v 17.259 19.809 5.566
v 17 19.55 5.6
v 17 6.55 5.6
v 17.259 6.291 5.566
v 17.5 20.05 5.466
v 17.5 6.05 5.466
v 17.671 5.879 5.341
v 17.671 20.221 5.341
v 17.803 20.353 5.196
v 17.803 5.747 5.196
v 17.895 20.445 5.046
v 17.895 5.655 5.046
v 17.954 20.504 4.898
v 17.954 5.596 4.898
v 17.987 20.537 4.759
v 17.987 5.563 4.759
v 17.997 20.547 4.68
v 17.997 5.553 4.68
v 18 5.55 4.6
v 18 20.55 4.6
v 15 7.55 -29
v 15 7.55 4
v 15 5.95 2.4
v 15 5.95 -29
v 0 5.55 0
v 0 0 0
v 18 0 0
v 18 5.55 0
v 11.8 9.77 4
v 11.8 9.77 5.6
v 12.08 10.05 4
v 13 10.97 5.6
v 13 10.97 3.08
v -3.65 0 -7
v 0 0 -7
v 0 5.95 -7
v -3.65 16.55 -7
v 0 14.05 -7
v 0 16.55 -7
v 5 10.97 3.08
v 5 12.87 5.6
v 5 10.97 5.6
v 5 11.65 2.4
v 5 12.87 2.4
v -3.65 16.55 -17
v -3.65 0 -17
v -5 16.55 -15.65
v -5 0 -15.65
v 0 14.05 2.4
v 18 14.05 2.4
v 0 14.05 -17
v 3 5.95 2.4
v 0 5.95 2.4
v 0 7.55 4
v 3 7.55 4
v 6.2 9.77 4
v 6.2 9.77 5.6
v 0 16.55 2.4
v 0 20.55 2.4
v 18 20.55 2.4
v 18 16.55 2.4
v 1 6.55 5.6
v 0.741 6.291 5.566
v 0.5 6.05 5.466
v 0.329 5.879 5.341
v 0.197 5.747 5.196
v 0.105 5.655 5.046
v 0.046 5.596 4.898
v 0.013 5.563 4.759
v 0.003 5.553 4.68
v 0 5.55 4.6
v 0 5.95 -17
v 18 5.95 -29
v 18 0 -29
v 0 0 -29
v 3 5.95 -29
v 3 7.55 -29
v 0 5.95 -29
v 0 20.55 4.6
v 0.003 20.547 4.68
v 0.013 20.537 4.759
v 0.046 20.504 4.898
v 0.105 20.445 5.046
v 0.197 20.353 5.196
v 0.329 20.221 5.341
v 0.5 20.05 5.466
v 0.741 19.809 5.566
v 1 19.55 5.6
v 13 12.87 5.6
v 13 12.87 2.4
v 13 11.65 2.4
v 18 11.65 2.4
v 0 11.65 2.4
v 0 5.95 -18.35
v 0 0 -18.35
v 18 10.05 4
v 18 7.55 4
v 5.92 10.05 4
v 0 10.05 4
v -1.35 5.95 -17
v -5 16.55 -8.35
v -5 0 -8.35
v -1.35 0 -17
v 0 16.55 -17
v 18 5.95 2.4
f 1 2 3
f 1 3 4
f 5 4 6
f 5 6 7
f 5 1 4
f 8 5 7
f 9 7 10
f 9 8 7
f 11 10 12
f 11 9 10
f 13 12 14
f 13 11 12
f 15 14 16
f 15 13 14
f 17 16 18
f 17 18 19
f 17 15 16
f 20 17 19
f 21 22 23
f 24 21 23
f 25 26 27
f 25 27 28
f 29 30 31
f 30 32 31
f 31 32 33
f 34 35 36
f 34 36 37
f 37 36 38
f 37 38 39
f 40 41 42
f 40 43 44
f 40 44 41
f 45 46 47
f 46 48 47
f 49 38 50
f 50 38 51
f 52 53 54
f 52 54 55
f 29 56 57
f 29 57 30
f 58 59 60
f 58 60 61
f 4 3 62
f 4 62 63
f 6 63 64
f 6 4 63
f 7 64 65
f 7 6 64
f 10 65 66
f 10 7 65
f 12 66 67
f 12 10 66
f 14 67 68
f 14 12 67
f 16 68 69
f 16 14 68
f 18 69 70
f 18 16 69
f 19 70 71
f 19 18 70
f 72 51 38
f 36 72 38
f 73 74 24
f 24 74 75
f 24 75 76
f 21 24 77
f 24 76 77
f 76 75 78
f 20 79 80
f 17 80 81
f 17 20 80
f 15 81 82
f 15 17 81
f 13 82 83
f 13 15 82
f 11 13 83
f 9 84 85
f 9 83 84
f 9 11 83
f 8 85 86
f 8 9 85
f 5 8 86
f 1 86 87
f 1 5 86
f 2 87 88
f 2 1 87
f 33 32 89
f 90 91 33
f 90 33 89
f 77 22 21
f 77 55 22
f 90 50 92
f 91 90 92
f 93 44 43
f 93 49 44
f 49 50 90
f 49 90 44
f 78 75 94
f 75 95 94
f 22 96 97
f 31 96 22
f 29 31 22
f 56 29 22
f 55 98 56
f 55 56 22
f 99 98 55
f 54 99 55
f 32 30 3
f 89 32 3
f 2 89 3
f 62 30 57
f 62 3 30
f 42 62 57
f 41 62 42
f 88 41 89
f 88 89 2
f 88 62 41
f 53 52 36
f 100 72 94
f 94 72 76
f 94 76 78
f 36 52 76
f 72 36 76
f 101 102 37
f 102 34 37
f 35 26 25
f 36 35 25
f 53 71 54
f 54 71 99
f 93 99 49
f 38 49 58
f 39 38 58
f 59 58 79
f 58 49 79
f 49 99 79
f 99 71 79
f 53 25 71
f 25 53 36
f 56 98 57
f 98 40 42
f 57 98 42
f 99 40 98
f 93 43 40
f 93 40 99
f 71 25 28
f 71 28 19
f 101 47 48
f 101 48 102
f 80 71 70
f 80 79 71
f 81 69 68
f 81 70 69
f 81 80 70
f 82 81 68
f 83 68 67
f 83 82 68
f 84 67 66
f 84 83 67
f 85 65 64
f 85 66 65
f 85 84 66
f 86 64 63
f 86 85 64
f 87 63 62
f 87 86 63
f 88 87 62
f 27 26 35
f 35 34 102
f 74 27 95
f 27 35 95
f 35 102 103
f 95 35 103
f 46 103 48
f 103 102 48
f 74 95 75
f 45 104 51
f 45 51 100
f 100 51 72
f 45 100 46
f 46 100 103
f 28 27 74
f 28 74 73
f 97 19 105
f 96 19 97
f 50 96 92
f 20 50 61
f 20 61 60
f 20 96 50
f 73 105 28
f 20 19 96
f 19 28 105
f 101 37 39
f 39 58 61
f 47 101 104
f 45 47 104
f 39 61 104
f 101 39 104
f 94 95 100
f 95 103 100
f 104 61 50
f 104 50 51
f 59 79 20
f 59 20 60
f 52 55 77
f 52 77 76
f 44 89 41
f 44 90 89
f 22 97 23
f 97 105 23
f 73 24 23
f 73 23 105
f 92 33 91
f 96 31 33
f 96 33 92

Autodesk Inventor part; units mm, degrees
ref_plane "YZ Plane" through (0, 0, 0) normal (1, 0, 0) x (0, 1, 0)
ref_plane "XZ Plane" through (0, 0, 0) normal (0, 1, 0) x (-1, 0, 0)
ref_plane "XY Plane" through (0, 0, 0) normal (0, 0, 1) x (1, 0, 0)
sketch "Sketch1" plane through (0, 0, 0) normal (1, 0, 0) x (0, 1, 0)
  line L0 (0, 0) -> (5.55, 0)
  line L1 (5.55, 0) -> (5.55, 5.6)
  line L2 (5.55, 5.6) -> (20.55, 5.6)
  line L3 (20.55, 5.6) -> (20.55, 2.4)
  line L4 (20.55, 2.4) -> (10.05, 2.4)
  line L5 (10.05, 2.4) -> (10.05, 4)
  line L6 (10.05, 4) -> (7.55, 4)
  line L7 (7.55, 4) -> (7.55, -29)
  line L8 (0, 0) -> (0, -29)
  line L9 (0, -29) -> (7.55, -29)
  dimension "d1" = 5.55
  dimension "d2" = 15
  dimension "d3" = 2
  dimension "d4" = 2.5
  dimension "d5" = 1.6
  dimension "d6" = 29
  dimension "d7" = 33
  dimension "d8" = 3.2
extrude "Extrusion1" add sketch "Sketch1" along normal blind 18
sketch "Sketch2" plane through (0, 10.05, 2.4) normal (0, 0, -1) x (-1, 0, 0)
  line L0 (0, 0) -> (-18, 0) projected
  line L1 (-9, 0) -> (-9, -5.1044) construction
  line L2 (-13, 2.82) -> (-5, 2.82)
  line L3 (-5, 2.82) -> (-5, -0.28)
  line L4 (-5, -0.28) -> (-13, -0.28)
  line L5 (-13, -0.28) -> (-13, 2.82)
  point P0 (0, -10.05)
  point P1 (-9, -0.28)
  dimension "d11" = 3.1
  dimension "d12" = 8
extrude "Extrusion2" cut sketch "Sketch2" against normal up to surface (3.2 mm away)
chamfer "Chamfer1" distance 1.2 angle 45 2 edges at (5, 9.77, 4.8) (13, 9.77, 4.8)
chamfer "Chamfer2" distance 1.6 angle 45 2 edges at (15.04, 10.05, 2.4) (2.96, 10.05, 2.4)
fillet "Fillet1" radius 1 4 edges at (9, 5.55, 5.6) (9, 20.55, 5.6) (18, 13.05, 5.6) (0, 13.05, 5.6)
sketch "Sketch3" plane through (0, 0, -29) normal (0, 0, -1) x (-1, 0, 0)
  line L0 (0, 7.55) -> (-18, 7.55) projected
  line L1 (-9, 7.55) -> (-9, 5.1292) construction
  line L2 (-18, 7.55) -> (-15, 7.55)
  line L3 (-15, 7.55) -> (-15, 5.95)
  line L4 (-15, 5.95) -> (-18, 5.95)
  line L5 (-18, 5.95) -> (-18, 7.55)
  line L6 (0, 7.55) -> (-3, 7.55)
  line L7 (-3, 7.55) -> (-3, 5.95)
  line L8 (-3, 5.95) -> (0, 5.95)
  line L9 (0, 5.95) -> (0, 7.55)
  line L10 (0, 7.55) -> (-18, 7.55) projected
  line L11 (-18, 0) -> (-18, 7.55) projected
  point P0 (0, 0)
  dimension "d22" = 3
  dimension "d23" = 1.6
extrude "Extrusion3" cut sketch "Sketch3" against normal up to surface (33 mm away)
chamfer "Chamfer3" distance 1.6 angle 45 2 edges at (16.5, 5.95, 4) (1.5, 5.95, 4)
sketch "Sketch4" plane through (0, 0, 0) normal (-1, 0, 0) x (0, 0, 1)
  line L0 (-17, 0) -> (-7, 0)
  line L1 (-7, 0) -> (-7, 16.55)
  line L2 (-7, 16.55) -> (-17, 16.55)
  line L3 (-17, 16.55) -> (-17, 0)
  line L4 (2.4, 5.95) -> (-29, 5.95) projected
  line L5 (-29, 0) -> (0, 0) projected
  line L6 (0, 0) -> (0, 5.55) projected
  line L7 (4.6, 20.55) -> (2.4, 20.55) projected
  dimension "d29" = 10
  dimension "d30" = 7
  dimension "d31" = 4
extrude "Extrusion4" add sketch "Sketch4" along normal blind 5
sketch "Sketch5" plane through (0, 16.55, -7) normal (0, 1, 0) x (1, 0, 0)
  line L0 (0, -9.4) -> (18, -9.4) projected
  line L1 (0, 0) -> (-5, 0) projected
  line L2 (0, 0) -> (0, 10) projected
  line L3 (0, 10) -> (-5, 10) projected
  line L4 (-5, 0) -> (-5, 10) projected
  line L5 (0, 10) -> (0, 22) projected
  line L6 (-5, 10) -> (-5, 0) projected
  line L7 (0, 10) -> (-5, 10)
  line L8 (-5, 10) -> (-5, 0)
  line L9 (-5, 0) -> (0, 0)
  line L10 (13, -9.4) -> (5, -9.4) projected
  line L11 (13, -9.4) -> (18, -9.4) projected
  line L12 (5, -9.4) -> (18, -9.4)
  line L13 (18, -9.4) -> (0, 10)
  line L14 (3, -9.4) -> (0, -9.4) projected
  line L15 (0, 0) -> (0, -9.4)
  line L16 (0, -9.4) -> (18, -9.4)
  point P0 (0, -7)
extrude "Extrusion5" add sketch "Sketch5" against normal blind 2.5
chamfer "Chamfer4" distance 1.35 angle 45 3 edges at (-5, 8.275, -7) (-5, 8.275, -17) (0, 2.975, -17)
properties part number "pro_micro_mount"
